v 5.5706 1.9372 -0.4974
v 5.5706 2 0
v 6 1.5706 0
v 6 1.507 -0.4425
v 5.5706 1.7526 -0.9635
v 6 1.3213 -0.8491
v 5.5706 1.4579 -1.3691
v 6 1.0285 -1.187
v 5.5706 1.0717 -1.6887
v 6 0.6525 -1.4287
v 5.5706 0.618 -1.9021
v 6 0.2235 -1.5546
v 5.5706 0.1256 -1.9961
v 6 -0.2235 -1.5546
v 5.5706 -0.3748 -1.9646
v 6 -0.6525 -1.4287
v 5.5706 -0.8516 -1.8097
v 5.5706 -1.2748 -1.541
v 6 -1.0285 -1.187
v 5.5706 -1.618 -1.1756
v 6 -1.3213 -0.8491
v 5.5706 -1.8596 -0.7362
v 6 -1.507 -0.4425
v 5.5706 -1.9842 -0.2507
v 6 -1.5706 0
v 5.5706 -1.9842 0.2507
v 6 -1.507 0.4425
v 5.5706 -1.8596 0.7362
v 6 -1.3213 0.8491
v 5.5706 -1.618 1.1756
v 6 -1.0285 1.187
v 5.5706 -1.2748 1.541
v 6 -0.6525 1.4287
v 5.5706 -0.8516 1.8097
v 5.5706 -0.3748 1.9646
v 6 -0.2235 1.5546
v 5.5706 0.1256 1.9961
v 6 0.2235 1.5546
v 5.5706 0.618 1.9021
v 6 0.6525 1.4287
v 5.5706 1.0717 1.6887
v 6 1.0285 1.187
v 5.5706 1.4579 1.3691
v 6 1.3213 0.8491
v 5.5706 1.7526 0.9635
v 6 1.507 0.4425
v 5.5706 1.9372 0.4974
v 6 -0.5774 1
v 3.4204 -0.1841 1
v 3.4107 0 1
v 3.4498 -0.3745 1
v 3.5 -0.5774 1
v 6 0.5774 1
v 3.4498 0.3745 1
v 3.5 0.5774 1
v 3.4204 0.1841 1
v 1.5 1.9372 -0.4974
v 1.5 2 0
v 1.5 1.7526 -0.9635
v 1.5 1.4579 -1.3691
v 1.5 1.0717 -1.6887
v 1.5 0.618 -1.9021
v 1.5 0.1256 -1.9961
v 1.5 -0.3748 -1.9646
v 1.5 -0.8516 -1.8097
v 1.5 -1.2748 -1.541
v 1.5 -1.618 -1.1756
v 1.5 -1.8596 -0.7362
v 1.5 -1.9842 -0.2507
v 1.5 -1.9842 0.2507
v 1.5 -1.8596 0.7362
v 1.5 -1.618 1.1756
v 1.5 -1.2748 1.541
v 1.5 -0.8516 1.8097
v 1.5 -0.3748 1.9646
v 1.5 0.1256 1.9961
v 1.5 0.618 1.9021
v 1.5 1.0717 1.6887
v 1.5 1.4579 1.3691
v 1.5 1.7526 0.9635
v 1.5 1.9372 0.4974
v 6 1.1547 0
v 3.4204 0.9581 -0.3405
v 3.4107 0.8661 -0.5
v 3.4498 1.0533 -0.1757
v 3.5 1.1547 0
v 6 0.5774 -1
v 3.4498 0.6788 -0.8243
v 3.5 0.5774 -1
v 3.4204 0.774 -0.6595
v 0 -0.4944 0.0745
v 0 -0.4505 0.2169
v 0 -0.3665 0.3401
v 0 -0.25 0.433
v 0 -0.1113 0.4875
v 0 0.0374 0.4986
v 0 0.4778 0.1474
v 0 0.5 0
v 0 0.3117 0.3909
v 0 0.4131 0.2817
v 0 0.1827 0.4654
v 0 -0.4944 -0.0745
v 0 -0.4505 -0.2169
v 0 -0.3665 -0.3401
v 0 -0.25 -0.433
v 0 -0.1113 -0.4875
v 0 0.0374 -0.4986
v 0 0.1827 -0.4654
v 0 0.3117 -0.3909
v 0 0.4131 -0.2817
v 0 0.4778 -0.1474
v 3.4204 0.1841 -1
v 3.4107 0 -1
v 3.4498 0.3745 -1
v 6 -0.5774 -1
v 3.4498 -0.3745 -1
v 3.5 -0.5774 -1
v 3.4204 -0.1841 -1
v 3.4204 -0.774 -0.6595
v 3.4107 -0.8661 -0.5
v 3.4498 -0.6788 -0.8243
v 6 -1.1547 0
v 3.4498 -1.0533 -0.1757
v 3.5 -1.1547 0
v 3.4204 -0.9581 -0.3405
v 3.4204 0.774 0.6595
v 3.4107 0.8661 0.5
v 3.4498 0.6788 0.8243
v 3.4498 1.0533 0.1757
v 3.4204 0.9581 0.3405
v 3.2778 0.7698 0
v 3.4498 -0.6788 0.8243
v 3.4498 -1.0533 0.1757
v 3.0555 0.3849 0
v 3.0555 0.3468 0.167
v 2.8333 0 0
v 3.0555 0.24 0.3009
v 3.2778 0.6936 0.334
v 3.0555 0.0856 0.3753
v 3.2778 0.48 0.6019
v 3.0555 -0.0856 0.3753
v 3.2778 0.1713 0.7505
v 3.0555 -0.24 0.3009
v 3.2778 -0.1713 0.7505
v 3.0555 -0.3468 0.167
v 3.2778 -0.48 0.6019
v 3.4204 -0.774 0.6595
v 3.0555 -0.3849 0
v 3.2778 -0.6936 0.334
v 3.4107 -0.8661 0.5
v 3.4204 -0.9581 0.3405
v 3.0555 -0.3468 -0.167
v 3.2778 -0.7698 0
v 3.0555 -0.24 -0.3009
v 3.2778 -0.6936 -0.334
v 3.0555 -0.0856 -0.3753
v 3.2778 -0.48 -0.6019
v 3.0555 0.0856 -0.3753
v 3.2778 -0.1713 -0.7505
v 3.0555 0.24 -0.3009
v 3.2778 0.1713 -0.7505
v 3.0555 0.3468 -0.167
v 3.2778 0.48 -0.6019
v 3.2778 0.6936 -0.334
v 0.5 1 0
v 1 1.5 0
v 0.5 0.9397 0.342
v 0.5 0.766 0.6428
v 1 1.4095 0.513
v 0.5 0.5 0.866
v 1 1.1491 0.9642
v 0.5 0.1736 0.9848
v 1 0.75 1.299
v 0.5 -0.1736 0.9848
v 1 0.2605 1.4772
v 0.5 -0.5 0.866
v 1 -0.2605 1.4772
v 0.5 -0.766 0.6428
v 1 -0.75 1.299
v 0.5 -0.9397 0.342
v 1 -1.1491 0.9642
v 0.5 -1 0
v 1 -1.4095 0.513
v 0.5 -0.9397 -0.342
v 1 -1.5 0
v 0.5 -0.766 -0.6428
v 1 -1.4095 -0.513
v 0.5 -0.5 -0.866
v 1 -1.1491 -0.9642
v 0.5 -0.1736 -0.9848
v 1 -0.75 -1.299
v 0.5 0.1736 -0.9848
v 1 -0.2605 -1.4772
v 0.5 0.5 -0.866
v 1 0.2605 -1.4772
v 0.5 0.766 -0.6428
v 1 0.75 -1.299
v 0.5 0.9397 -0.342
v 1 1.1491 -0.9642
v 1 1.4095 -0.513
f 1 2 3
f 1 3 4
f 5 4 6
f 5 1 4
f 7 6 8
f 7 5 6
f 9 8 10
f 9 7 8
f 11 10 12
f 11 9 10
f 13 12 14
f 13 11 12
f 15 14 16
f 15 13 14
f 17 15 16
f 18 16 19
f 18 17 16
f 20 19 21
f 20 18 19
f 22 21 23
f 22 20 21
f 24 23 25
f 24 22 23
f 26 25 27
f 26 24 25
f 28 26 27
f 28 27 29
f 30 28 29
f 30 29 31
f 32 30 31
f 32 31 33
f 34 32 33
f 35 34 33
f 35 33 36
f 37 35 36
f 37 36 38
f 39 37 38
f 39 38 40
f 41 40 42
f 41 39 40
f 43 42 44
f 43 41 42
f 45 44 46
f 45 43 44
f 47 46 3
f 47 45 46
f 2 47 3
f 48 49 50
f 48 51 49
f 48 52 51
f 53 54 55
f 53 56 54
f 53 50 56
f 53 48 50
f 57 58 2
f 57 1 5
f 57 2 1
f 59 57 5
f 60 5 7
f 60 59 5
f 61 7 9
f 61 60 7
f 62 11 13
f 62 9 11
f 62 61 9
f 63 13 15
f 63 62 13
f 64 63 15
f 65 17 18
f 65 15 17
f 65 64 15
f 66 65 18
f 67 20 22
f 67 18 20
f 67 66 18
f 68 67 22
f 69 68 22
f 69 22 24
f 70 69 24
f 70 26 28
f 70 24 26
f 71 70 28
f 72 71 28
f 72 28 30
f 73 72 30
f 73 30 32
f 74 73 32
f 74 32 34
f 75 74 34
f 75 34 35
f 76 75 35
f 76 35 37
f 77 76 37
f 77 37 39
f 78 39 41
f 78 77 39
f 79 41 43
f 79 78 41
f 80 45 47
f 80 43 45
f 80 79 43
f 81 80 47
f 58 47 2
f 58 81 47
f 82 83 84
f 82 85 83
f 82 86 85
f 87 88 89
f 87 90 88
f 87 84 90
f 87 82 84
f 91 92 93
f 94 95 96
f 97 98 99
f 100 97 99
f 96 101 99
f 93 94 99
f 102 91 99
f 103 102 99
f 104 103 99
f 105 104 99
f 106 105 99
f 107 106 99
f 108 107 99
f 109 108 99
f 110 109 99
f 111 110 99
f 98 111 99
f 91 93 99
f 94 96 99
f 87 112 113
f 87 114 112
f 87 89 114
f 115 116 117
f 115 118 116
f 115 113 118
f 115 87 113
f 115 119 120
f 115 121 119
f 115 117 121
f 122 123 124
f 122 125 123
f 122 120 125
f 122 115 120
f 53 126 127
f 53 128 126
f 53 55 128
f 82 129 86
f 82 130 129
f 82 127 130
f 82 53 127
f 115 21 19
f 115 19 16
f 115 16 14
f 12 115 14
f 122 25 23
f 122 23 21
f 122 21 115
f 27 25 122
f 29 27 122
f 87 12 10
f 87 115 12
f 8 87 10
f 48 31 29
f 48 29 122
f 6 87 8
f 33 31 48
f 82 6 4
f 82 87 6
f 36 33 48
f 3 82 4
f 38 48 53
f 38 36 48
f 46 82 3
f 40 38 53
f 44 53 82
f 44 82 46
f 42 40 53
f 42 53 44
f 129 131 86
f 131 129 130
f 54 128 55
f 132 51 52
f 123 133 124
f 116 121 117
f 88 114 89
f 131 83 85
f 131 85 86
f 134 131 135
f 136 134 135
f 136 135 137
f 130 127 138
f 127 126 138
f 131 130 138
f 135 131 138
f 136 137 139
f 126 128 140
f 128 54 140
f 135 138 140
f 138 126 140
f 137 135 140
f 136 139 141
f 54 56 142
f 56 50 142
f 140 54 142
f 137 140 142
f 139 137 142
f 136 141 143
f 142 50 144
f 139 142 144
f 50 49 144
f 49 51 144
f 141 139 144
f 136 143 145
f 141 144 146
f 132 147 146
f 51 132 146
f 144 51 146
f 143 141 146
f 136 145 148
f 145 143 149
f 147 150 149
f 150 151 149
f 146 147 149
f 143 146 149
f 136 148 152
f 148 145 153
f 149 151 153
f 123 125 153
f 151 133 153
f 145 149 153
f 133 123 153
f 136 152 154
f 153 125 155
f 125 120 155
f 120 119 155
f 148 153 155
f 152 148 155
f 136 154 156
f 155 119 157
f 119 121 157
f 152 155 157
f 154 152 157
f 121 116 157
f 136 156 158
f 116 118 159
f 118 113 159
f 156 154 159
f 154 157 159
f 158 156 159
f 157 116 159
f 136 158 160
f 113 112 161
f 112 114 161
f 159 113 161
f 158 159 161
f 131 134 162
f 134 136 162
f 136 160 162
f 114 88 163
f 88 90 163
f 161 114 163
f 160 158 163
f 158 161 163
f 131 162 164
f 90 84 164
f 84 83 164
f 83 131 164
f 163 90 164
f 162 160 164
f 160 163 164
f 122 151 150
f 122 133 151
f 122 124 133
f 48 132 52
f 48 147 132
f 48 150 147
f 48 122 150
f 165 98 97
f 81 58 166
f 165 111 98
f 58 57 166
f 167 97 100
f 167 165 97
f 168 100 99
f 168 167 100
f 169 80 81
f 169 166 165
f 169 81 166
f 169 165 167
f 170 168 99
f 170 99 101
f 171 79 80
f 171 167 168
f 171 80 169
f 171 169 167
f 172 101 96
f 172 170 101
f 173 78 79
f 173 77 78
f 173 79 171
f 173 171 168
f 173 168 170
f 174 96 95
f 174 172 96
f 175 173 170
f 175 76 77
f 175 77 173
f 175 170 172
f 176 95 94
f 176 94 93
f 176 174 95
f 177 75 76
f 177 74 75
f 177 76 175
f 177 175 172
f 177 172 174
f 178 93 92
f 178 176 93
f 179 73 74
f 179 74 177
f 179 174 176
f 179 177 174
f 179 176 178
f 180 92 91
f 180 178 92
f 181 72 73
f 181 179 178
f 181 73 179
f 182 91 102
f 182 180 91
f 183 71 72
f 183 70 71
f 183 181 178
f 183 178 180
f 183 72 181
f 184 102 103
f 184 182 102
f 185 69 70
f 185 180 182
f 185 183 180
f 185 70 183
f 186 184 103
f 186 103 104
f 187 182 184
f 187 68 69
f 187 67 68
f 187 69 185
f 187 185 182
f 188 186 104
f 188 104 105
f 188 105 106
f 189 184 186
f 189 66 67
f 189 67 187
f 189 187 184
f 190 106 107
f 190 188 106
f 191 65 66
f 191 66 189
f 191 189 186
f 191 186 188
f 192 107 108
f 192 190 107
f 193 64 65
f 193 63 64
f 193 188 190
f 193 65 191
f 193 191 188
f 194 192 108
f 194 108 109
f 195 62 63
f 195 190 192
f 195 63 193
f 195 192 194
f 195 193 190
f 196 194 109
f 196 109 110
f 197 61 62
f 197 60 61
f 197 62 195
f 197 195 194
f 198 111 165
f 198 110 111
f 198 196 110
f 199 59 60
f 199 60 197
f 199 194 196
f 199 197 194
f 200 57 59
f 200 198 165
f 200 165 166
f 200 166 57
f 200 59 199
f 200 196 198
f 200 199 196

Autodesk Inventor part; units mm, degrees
ref_plane "YZ Plane" through (0, 0, 0) normal (1, 0, 0) x (0, 1, 0)
ref_plane "XZ Plane" through (0, 0, 0) normal (0, 1, 0) x (-1, 0, 0)
sketch "Sketch1" plane through (0, 0, 0) normal (0, 0, 1) x (1, 0, 0)
  line L0 (0, 0) -> (2.8333, 0)
  line L1 (6, 1.1547) -> (6, 2)
  line L2 (6, 2) -> (0, 2)
  line L3 (6, 1.1547) -> (3.5, 1.1547)
  line L4 (3.5, 1.1547) -> (2.8333, 0)
  line L5 (0, -0.4) -> (0, 2.4) projected
  line L6 (0, 2) -> (0, 0)
  dimension "d0" = 2.5
  dimension "d1" = 60
  dimension "d2" = 4
  dimension "d3" = 2.3094
  dimension "d5" = 6
revolve "Body" add sketch "Sketch1" angle 360 about axis through (0, 0, 0) along (1, 0, 0)
sketch "Sketch2" plane through (6, 0, 0) normal (1, 0, 0) x (0, 1, 0)
  circle A0 centre (0, 0) radius 1.1547 projected
  line L0 (-0.5774, 1) -> (0.5774, 1)
  line L1 (0.5774, 1) -> (1.1547, 0)
  line L2 (1.1547, 0) -> (0.5774, -1)
  line L3 (0.5774, -1) -> (-0.5774, -1)
  line L4 (-0.5774, -1) -> (-1.1547, 0)
  line L5 (-1.1547, 0) -> (-0.5774, 1)
  point P0 (0, 0)
  point P1 (0, 0)
extrude "Slot" add sketch "Sketch2" against normal up to next contours L1 A0 | A0 L2 | L0 A0 | A0 L3 | L5 A0 | A0 L4
thread "Thread" size "M4x0.7" class "6g" standard "ISO Metric profile" length 6
chamfer "Chamfer1" distance 1.5 angle 45 1 edges at (0, -2, 0) measured on face at (4, 1.9741, -0.3208)
chamfer "Chamfer2" distance 0.4294 angle 45 1 edges at (6, -2, 0) measured on face at (4.5, 1.9741, -0.3208)
ref_plane "Work Plane1" through (3, 0, 0) normal (0, 0, 1) x (1, 0, 0)
equation "\"d0\" = INTI"
equation "\"d2\" = NND"
equation "\"d3\" = 1.1547 * SW"
equation "\"d5\" = NLG"
equation "\"d12\" = NLG"
equation "\"d9\" = FAWI"
equation "\"d10\" = -0.5 * GD1 + 0.5 * NND"
equation "\"d11\" = FAWI"
equation "\"d35\" = -0.5 * GD1 + 0.5 * NND"
equation "\"NND\" = 4"
equation "\"NLG\" = 6"
equation "\"INTI\" = 2.5"
equation "\"FAWI\" = 45deg"
equation "\"SW\" = 2"
equation "\"GD1\" = THREADDIA - 1.2269 * PTC"
equation "\"FAWI1\" = 45deg"
equation "\"SPD\" = 1"
equation "\"GUL\" = 0.61345 * PTC"
equation "\"TOA\" = 30deg"
equation "\"THREADDIA\" = 4"
equation "\"PTC\" = 0.7"
equation "\"GAL\" = 0.61345 * PTC"
equation "\"E0\" = 1.155 * SW"
properties part number "ISO 4027 - M4 x 6" material "Stainless Steel, 440C"
